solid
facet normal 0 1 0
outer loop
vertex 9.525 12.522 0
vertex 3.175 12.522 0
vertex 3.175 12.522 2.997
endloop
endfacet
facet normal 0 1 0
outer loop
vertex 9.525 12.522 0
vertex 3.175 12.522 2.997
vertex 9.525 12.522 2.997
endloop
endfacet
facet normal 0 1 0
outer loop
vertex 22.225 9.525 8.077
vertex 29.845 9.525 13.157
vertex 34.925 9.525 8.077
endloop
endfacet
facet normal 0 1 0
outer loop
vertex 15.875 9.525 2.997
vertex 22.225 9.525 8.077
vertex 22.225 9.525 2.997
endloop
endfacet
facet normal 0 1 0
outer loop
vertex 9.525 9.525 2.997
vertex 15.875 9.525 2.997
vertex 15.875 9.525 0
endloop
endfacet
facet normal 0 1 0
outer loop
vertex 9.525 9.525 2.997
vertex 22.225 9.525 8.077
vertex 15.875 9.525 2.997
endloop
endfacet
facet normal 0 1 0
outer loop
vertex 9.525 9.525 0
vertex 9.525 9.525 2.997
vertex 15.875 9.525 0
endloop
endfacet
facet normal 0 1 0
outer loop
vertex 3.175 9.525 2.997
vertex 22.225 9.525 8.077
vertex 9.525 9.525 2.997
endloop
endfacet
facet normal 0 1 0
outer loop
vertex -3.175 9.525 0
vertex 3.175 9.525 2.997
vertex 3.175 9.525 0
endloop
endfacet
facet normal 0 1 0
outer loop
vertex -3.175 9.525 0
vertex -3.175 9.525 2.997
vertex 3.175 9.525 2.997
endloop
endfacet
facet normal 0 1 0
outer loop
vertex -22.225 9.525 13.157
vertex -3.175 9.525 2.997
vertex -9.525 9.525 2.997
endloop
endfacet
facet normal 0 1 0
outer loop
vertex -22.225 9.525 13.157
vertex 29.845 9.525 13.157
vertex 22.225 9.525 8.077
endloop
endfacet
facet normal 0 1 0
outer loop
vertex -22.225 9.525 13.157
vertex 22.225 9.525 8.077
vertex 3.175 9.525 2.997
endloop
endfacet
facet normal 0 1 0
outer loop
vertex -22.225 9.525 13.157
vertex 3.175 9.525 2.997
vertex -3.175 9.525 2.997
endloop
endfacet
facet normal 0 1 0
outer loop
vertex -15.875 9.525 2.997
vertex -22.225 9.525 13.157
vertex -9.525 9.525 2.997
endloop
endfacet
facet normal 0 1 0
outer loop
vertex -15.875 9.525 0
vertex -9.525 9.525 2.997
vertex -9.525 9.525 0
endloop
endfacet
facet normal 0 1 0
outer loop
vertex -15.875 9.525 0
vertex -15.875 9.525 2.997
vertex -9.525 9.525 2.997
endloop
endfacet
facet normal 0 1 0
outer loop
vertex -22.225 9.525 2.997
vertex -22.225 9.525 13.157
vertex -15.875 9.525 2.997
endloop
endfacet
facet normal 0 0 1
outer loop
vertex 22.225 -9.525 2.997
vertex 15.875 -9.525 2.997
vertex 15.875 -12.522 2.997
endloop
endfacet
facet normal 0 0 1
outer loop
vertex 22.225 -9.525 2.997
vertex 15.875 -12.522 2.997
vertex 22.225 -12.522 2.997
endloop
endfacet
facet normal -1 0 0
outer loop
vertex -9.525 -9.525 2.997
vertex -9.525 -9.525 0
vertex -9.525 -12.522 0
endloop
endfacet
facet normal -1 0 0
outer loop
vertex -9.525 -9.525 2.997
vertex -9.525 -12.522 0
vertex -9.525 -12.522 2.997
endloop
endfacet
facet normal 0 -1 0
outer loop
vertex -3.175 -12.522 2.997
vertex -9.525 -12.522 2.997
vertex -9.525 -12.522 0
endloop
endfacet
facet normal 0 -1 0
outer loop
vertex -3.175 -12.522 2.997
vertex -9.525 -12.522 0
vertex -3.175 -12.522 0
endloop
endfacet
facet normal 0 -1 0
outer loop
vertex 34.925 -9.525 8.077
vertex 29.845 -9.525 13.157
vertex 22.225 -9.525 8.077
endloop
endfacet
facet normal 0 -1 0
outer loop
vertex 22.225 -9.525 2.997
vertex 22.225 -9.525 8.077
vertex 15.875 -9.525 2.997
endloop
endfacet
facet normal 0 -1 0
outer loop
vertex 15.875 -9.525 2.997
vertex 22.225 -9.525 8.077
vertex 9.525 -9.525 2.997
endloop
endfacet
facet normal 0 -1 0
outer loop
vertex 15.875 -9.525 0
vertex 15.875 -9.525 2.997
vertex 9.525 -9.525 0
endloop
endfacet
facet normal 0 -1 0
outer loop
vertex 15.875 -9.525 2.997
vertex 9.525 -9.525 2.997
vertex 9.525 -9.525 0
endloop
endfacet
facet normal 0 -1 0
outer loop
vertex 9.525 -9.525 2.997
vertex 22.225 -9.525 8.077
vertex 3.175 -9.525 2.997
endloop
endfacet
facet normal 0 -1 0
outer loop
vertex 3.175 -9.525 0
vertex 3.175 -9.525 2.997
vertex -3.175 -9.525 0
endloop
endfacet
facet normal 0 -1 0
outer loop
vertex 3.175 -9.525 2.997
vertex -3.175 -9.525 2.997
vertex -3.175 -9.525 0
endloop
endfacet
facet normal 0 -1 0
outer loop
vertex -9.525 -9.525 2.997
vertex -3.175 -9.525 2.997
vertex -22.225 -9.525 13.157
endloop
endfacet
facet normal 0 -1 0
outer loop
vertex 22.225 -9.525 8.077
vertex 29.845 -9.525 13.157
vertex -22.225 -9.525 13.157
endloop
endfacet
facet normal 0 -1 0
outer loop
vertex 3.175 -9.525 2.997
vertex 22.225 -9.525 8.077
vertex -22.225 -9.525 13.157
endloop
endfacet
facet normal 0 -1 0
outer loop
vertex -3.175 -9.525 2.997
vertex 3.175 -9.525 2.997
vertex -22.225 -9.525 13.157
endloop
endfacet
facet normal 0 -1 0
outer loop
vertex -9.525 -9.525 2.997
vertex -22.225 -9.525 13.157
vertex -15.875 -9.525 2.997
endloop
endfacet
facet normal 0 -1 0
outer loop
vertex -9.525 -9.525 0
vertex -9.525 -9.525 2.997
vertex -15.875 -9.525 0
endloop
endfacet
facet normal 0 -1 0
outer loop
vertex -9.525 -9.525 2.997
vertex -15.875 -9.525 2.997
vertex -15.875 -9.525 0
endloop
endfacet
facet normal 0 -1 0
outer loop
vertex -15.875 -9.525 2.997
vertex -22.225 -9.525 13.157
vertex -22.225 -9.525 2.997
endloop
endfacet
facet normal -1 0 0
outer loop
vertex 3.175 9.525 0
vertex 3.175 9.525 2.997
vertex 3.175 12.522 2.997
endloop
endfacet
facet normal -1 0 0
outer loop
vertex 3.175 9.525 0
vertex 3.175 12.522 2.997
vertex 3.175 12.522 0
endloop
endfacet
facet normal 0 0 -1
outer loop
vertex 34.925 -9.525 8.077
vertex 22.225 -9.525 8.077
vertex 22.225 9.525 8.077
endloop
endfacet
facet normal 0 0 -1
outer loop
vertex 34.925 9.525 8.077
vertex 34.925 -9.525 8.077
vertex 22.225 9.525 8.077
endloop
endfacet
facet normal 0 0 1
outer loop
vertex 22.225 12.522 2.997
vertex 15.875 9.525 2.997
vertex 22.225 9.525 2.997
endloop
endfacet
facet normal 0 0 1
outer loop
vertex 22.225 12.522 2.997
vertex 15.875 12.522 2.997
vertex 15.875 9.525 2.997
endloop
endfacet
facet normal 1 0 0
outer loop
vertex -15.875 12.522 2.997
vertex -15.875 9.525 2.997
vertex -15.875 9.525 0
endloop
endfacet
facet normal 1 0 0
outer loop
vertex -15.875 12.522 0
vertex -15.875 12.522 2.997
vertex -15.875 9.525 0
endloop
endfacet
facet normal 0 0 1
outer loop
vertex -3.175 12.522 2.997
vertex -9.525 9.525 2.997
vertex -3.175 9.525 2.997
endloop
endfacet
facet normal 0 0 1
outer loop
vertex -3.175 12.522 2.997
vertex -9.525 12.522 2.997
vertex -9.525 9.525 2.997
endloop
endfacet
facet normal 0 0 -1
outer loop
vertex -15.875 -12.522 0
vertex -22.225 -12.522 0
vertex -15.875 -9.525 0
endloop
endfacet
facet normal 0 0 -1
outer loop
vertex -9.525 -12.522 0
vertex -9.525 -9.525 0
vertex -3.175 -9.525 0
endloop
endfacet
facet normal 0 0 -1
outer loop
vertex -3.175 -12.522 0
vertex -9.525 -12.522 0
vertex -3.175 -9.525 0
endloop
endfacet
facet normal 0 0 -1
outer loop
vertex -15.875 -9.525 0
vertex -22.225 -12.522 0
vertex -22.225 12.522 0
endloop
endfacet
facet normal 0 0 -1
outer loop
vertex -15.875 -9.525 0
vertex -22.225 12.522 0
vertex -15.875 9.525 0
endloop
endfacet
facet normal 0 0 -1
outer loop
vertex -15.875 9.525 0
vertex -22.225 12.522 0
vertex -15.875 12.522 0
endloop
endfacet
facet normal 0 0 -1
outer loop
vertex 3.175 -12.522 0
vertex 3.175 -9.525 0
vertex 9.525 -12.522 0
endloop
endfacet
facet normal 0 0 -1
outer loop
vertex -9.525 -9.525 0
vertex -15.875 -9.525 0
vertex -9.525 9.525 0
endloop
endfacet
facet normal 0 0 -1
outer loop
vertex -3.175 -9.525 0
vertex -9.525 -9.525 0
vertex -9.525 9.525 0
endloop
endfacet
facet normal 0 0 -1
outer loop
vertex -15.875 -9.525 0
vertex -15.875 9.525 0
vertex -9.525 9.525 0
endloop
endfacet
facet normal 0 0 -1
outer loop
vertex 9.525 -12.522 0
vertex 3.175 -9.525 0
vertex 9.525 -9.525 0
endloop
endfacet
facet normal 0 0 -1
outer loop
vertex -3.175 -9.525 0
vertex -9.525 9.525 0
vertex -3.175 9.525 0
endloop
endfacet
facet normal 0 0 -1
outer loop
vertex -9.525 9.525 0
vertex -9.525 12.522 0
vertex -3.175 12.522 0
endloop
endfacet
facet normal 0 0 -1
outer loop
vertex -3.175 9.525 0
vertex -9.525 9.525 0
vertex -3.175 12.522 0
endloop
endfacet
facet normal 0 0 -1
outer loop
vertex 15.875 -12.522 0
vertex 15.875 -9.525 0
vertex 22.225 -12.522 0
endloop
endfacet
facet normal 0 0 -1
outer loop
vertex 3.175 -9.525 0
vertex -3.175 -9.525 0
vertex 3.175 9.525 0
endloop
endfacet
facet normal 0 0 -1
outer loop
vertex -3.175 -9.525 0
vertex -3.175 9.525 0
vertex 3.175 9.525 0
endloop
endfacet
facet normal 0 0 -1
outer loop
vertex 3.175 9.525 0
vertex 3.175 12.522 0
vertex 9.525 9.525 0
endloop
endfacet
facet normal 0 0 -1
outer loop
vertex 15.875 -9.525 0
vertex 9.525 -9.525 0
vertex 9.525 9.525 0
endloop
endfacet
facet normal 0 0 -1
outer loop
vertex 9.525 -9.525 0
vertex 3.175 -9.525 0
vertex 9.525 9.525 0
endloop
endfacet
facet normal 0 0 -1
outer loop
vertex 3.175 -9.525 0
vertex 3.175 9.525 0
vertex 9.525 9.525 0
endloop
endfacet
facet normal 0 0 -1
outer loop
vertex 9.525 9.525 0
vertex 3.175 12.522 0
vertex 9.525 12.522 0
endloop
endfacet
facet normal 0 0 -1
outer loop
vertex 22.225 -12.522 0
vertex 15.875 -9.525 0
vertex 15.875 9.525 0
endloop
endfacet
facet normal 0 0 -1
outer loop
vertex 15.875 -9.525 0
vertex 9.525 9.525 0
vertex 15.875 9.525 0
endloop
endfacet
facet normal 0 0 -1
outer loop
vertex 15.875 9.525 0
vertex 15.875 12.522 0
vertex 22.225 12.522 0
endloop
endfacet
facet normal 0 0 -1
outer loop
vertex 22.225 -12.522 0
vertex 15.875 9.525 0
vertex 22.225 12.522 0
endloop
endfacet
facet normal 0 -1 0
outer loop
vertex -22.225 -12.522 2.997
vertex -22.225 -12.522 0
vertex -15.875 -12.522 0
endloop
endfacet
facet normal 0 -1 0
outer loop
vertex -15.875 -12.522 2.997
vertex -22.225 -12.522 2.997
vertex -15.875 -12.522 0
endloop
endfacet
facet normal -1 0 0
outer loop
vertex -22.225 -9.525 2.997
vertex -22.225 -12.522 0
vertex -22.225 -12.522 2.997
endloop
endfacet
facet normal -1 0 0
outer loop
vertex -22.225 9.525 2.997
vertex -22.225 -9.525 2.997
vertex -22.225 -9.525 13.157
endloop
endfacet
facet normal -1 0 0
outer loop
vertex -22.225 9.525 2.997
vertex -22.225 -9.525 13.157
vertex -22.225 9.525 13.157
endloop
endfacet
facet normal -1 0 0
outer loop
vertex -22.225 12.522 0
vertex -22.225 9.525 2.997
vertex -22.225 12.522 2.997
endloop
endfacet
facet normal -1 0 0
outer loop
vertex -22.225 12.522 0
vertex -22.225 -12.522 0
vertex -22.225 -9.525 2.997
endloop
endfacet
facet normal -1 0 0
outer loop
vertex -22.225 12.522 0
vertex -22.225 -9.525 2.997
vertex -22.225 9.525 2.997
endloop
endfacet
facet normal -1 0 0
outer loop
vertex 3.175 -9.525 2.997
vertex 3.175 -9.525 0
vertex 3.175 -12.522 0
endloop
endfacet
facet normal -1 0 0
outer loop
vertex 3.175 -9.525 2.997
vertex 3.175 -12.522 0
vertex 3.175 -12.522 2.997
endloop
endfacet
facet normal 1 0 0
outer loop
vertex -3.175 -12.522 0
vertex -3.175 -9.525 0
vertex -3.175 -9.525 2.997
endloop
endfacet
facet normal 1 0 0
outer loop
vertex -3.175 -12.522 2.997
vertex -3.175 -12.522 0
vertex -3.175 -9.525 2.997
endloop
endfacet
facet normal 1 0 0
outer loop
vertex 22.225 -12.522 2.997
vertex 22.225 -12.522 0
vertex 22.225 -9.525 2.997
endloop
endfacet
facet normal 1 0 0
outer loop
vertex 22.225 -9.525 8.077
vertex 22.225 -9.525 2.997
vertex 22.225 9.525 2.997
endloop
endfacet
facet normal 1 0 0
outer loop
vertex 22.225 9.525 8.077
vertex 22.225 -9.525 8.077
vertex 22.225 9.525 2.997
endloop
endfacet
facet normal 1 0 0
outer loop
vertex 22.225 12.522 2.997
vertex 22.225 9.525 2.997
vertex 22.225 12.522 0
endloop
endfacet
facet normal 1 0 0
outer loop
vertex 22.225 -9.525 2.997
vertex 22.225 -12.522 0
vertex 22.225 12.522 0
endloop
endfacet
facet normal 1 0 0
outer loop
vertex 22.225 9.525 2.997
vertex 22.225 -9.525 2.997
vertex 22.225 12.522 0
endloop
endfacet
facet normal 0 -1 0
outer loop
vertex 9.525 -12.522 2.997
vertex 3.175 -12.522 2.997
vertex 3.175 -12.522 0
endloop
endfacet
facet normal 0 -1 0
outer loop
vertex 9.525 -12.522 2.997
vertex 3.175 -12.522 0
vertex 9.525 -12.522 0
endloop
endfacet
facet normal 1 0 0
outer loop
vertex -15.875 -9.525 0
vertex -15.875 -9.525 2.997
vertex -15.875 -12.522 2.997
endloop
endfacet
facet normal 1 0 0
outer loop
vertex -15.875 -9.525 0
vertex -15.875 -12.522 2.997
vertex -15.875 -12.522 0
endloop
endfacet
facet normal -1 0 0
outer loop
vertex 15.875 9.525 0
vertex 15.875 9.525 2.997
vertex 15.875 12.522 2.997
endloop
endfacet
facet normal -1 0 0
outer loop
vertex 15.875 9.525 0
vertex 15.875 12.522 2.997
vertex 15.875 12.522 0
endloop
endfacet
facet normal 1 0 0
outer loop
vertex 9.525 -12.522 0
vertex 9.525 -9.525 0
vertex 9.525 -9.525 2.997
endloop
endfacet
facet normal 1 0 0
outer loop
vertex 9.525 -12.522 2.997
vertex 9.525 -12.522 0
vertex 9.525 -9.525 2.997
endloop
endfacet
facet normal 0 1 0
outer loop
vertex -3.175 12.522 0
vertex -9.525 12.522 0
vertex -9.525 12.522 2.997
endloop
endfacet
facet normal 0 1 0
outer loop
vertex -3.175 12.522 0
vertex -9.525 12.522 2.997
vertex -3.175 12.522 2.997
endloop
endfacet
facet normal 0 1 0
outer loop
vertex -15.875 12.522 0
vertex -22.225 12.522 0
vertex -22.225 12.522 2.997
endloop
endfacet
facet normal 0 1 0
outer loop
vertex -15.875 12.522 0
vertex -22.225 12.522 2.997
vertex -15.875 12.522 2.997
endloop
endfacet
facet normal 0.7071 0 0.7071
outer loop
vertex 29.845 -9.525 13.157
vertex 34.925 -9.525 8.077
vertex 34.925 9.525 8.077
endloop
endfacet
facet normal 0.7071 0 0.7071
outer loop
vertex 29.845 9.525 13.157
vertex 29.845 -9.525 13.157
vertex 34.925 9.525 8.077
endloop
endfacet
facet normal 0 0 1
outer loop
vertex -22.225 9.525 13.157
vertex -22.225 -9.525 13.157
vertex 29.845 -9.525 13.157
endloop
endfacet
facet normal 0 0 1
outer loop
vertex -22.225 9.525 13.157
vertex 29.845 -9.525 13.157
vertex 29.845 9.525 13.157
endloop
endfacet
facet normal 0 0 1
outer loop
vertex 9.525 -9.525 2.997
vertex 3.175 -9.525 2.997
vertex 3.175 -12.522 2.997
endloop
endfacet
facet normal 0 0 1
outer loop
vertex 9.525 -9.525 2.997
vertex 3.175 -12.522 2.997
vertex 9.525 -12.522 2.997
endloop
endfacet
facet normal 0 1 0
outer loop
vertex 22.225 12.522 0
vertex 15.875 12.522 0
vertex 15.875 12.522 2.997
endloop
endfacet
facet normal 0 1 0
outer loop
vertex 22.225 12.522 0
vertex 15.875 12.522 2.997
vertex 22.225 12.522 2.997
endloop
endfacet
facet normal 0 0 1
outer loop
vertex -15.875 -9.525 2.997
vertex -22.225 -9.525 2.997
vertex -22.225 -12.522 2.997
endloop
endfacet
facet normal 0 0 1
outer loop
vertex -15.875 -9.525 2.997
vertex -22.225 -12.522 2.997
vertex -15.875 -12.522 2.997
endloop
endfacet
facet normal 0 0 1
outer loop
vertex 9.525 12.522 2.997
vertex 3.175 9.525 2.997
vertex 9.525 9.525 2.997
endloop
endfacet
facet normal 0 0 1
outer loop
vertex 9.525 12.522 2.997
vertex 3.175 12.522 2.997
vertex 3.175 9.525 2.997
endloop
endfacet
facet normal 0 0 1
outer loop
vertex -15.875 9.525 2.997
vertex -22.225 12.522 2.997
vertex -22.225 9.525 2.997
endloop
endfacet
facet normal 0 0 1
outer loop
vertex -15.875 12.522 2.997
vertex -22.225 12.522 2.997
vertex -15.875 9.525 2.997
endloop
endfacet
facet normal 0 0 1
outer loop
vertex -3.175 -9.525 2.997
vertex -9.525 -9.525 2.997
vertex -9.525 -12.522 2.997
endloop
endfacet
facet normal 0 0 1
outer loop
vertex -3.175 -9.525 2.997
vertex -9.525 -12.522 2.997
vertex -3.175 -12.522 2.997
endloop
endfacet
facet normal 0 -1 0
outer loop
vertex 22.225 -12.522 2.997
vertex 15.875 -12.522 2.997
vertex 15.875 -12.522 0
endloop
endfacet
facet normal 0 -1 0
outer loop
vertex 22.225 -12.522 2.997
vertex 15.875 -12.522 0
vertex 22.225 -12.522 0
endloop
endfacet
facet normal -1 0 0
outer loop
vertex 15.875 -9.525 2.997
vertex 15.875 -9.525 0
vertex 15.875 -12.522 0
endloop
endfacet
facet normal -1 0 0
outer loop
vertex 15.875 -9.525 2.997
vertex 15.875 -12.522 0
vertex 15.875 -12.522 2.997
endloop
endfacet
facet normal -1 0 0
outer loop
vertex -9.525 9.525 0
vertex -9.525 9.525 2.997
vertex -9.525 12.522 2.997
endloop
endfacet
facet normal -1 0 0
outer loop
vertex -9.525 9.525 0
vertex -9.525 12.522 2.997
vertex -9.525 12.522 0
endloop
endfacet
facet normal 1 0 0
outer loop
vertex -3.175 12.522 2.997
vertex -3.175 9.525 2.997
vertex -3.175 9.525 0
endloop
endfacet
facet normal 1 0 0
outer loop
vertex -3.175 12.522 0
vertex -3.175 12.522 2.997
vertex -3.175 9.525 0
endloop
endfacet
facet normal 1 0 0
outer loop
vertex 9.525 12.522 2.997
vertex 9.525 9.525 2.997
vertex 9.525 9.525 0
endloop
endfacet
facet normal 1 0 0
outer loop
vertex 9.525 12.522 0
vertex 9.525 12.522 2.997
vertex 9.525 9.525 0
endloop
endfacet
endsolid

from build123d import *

# Parameters (mm, degrees)
SKETCH1_W               = 44.45
SKETCH1_H               = 19.05
BODY_DEPTH              = 2.9972
SKETCH2_W               = 6.35
SKETCH2_H               = 2.9972
TAB_DEPTH               = 2.9972
LPATTERN1_COUNT         = 4
LPATTERN1_PITCH         = 12.7
MIRROR1_COPY_1_SKETCH_W = 6.35
MIRROR1_COPY_1_SKETCH_H = 2.9972
MIRROR1_COPY_1_DEPTH    = 2.9972
MIRROR1_COPY_2_SKETCH_W = 6.35
MIRROR1_COPY_2_SKETCH_H = 2.9972
MIRROR1_COPY_2_DEPTH    = 2.9972
MIRROR1_COPY_3_SKETCH_W = 6.35
MIRROR1_COPY_3_SKETCH_H = 2.9972
MIRROR1_COPY_3_DEPTH    = 2.9972
SKETCH3_W               = 44.45
SKETCH3_H               = 19.05
BOSS_EXTRUDE1_DEPTH     = 10.16
SKETCH4_W               = 5.08
SKETCH4_H               = 19.05
BOSS_EXTRUDE2_DEPTH     = 12.7
CHAMFER1_SIZE           = 5.08


with BuildPart() as part:
    # Sketch1 → Body (new body)
    with BuildSketch(Plane.XY):
        Rectangle(SKETCH1_W, SKETCH1_H)
    extrude(amount=BODY_DEPTH)

    # Sketch2 → Tab (add)
    with BuildSketch(Plane(origin=(0, 9.525, 0), x_dir=(1, 0, 0), z_dir=(0, 1, 0))):
        with Locations((-19.05, -1.4986)):
            Rectangle(SKETCH2_W, SKETCH2_H)
    tab = extrude(amount=TAB_DEPTH)

    # LPattern1: Tab ×4
    with Locations(*[(i * LPATTERN1_PITCH, 0, 0) for i in range(1, LPATTERN1_COUNT)]):
        add(tab)

    # Mirror1: Tab across plane
    add(tab.mirror(Plane.ZX))

    # Mirror1 copy 1 sketch → Mirror1 copy 1 (add)
    with BuildSketch(Plane(origin=(12.7, -9.525, 0), x_dir=(1, 0, 0), z_dir=(0, -1, 0))):
        with Locations((-19.05, 1.4986)):
            Rectangle(MIRROR1_COPY_1_SKETCH_W, MIRROR1_COPY_1_SKETCH_H)
    extrude(amount=MIRROR1_COPY_1_DEPTH)

    # Mirror1 copy 2 sketch → Mirror1 copy 2 (add)
    with BuildSketch(Plane(origin=(25.4, -9.525, 0), x_dir=(1, 0, 0), z_dir=(0, -1, 0))):
        with Locations((-19.05, 1.4986)):
            Rectangle(MIRROR1_COPY_2_SKETCH_W, MIRROR1_COPY_2_SKETCH_H)
    extrude(amount=MIRROR1_COPY_2_DEPTH)

    # Mirror1 copy 3 sketch → Mirror1 copy 3 (add)
    with BuildSketch(Plane(origin=(38.1, -9.525, 0), x_dir=(1, 0, 0), z_dir=(0, -1, 0))):
        with Locations((-19.05, 1.4986)):
            Rectangle(MIRROR1_COPY_3_SKETCH_W, MIRROR1_COPY_3_SKETCH_H)
    extrude(amount=MIRROR1_COPY_3_DEPTH)

    # Sketch3 → Boss-Extrude1 (add)
    with BuildSketch(Plane.XY.offset(2.9972)):
        Rectangle(SKETCH3_W, SKETCH3_H)
    extrude(amount=BOSS_EXTRUDE1_DEPTH)

    # Sketch4 → Boss-Extrude2 (add)
    with BuildSketch(Plane(origin=(22.225, 0, 0), x_dir=(0, 0, -1), z_dir=(1, 0, 0))):
        with Locations((-10.6172, 0)):
            Rectangle(SKETCH4_W, SKETCH4_H)
    extrude(amount=BOSS_EXTRUDE2_DEPTH)

    # Chamfer1
    chamfer1_edges = [part.edges().sort_by_distance(p)[0] for p in [
        (34.925, 0, 13.1572),
    ]]
    chamfer(chamfer1_edges, length=CHAMFER1_SIZE - 0.0001)  # a hair under: the kernel refuses the full size


solid = part.part
